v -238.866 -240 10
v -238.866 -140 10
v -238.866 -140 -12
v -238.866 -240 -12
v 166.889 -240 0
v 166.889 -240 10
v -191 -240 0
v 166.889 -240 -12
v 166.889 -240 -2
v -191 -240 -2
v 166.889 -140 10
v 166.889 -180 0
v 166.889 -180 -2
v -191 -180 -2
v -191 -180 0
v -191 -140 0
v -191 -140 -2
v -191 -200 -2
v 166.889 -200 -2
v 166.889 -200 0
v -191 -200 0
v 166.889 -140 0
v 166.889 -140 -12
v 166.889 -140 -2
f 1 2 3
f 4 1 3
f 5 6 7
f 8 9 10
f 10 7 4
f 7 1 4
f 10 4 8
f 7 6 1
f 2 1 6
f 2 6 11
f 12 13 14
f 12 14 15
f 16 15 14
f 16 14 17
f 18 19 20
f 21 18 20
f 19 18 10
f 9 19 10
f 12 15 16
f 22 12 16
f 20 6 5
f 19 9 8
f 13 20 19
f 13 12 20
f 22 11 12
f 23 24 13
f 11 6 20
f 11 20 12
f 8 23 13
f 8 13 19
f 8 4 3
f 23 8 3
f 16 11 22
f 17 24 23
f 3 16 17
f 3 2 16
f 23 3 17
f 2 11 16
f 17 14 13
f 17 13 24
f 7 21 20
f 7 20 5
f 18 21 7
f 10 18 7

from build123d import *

# Parameters (mm, degrees)
BOSS_EXTRUDE1_DEPTH      = 166.889082
BOSS_EXTRUDE1_DEPTH_BACK = 238.865534
SKETCH1_W                = 22
SKETCH1_H                = 100
CAVITY1_START            = -191
CAVITY1_OUTLINE_W        = 40
CAVITY1_OUTLINE_H        = 2
CAVITY1_DEPTH            = 357.889082162


# Read off the part's stored shape, not the designer's step: Cavity1
with BuildPart() as part:
    # Sketch1 → Boss-Extrude1 (new, two sides: drawn at the far end of the back side and taken through both)
    with BuildSketch(Plane(origin=(0, 0, 0), x_dir=(0, 0, -1), z_dir=(1, 0, 0)).offset(-BOSS_EXTRUDE1_DEPTH_BACK)):
        with Locations((1, -190)):
            Rectangle(SKETCH1_W, SKETCH1_H)
    extrude(amount=BOSS_EXTRUDE1_DEPTH + BOSS_EXTRUDE1_DEPTH_BACK)

    # Cavity1 outline → Cavity1 (cut)
    with BuildSketch(Plane.YZ.offset(CAVITY1_START)):
        with Locations((-160, -1)):
            Rectangle(CAVITY1_OUTLINE_W, CAVITY1_OUTLINE_H)
    cavity1 = extrude(amount=CAVITY1_DEPTH, mode=Mode.SUBTRACT)

    # Mirror1: Cavity1 across plane
    add(cavity1.mirror(Plane.ZX.offset(-190)), mode=Mode.SUBTRACT)


solid = part.part
